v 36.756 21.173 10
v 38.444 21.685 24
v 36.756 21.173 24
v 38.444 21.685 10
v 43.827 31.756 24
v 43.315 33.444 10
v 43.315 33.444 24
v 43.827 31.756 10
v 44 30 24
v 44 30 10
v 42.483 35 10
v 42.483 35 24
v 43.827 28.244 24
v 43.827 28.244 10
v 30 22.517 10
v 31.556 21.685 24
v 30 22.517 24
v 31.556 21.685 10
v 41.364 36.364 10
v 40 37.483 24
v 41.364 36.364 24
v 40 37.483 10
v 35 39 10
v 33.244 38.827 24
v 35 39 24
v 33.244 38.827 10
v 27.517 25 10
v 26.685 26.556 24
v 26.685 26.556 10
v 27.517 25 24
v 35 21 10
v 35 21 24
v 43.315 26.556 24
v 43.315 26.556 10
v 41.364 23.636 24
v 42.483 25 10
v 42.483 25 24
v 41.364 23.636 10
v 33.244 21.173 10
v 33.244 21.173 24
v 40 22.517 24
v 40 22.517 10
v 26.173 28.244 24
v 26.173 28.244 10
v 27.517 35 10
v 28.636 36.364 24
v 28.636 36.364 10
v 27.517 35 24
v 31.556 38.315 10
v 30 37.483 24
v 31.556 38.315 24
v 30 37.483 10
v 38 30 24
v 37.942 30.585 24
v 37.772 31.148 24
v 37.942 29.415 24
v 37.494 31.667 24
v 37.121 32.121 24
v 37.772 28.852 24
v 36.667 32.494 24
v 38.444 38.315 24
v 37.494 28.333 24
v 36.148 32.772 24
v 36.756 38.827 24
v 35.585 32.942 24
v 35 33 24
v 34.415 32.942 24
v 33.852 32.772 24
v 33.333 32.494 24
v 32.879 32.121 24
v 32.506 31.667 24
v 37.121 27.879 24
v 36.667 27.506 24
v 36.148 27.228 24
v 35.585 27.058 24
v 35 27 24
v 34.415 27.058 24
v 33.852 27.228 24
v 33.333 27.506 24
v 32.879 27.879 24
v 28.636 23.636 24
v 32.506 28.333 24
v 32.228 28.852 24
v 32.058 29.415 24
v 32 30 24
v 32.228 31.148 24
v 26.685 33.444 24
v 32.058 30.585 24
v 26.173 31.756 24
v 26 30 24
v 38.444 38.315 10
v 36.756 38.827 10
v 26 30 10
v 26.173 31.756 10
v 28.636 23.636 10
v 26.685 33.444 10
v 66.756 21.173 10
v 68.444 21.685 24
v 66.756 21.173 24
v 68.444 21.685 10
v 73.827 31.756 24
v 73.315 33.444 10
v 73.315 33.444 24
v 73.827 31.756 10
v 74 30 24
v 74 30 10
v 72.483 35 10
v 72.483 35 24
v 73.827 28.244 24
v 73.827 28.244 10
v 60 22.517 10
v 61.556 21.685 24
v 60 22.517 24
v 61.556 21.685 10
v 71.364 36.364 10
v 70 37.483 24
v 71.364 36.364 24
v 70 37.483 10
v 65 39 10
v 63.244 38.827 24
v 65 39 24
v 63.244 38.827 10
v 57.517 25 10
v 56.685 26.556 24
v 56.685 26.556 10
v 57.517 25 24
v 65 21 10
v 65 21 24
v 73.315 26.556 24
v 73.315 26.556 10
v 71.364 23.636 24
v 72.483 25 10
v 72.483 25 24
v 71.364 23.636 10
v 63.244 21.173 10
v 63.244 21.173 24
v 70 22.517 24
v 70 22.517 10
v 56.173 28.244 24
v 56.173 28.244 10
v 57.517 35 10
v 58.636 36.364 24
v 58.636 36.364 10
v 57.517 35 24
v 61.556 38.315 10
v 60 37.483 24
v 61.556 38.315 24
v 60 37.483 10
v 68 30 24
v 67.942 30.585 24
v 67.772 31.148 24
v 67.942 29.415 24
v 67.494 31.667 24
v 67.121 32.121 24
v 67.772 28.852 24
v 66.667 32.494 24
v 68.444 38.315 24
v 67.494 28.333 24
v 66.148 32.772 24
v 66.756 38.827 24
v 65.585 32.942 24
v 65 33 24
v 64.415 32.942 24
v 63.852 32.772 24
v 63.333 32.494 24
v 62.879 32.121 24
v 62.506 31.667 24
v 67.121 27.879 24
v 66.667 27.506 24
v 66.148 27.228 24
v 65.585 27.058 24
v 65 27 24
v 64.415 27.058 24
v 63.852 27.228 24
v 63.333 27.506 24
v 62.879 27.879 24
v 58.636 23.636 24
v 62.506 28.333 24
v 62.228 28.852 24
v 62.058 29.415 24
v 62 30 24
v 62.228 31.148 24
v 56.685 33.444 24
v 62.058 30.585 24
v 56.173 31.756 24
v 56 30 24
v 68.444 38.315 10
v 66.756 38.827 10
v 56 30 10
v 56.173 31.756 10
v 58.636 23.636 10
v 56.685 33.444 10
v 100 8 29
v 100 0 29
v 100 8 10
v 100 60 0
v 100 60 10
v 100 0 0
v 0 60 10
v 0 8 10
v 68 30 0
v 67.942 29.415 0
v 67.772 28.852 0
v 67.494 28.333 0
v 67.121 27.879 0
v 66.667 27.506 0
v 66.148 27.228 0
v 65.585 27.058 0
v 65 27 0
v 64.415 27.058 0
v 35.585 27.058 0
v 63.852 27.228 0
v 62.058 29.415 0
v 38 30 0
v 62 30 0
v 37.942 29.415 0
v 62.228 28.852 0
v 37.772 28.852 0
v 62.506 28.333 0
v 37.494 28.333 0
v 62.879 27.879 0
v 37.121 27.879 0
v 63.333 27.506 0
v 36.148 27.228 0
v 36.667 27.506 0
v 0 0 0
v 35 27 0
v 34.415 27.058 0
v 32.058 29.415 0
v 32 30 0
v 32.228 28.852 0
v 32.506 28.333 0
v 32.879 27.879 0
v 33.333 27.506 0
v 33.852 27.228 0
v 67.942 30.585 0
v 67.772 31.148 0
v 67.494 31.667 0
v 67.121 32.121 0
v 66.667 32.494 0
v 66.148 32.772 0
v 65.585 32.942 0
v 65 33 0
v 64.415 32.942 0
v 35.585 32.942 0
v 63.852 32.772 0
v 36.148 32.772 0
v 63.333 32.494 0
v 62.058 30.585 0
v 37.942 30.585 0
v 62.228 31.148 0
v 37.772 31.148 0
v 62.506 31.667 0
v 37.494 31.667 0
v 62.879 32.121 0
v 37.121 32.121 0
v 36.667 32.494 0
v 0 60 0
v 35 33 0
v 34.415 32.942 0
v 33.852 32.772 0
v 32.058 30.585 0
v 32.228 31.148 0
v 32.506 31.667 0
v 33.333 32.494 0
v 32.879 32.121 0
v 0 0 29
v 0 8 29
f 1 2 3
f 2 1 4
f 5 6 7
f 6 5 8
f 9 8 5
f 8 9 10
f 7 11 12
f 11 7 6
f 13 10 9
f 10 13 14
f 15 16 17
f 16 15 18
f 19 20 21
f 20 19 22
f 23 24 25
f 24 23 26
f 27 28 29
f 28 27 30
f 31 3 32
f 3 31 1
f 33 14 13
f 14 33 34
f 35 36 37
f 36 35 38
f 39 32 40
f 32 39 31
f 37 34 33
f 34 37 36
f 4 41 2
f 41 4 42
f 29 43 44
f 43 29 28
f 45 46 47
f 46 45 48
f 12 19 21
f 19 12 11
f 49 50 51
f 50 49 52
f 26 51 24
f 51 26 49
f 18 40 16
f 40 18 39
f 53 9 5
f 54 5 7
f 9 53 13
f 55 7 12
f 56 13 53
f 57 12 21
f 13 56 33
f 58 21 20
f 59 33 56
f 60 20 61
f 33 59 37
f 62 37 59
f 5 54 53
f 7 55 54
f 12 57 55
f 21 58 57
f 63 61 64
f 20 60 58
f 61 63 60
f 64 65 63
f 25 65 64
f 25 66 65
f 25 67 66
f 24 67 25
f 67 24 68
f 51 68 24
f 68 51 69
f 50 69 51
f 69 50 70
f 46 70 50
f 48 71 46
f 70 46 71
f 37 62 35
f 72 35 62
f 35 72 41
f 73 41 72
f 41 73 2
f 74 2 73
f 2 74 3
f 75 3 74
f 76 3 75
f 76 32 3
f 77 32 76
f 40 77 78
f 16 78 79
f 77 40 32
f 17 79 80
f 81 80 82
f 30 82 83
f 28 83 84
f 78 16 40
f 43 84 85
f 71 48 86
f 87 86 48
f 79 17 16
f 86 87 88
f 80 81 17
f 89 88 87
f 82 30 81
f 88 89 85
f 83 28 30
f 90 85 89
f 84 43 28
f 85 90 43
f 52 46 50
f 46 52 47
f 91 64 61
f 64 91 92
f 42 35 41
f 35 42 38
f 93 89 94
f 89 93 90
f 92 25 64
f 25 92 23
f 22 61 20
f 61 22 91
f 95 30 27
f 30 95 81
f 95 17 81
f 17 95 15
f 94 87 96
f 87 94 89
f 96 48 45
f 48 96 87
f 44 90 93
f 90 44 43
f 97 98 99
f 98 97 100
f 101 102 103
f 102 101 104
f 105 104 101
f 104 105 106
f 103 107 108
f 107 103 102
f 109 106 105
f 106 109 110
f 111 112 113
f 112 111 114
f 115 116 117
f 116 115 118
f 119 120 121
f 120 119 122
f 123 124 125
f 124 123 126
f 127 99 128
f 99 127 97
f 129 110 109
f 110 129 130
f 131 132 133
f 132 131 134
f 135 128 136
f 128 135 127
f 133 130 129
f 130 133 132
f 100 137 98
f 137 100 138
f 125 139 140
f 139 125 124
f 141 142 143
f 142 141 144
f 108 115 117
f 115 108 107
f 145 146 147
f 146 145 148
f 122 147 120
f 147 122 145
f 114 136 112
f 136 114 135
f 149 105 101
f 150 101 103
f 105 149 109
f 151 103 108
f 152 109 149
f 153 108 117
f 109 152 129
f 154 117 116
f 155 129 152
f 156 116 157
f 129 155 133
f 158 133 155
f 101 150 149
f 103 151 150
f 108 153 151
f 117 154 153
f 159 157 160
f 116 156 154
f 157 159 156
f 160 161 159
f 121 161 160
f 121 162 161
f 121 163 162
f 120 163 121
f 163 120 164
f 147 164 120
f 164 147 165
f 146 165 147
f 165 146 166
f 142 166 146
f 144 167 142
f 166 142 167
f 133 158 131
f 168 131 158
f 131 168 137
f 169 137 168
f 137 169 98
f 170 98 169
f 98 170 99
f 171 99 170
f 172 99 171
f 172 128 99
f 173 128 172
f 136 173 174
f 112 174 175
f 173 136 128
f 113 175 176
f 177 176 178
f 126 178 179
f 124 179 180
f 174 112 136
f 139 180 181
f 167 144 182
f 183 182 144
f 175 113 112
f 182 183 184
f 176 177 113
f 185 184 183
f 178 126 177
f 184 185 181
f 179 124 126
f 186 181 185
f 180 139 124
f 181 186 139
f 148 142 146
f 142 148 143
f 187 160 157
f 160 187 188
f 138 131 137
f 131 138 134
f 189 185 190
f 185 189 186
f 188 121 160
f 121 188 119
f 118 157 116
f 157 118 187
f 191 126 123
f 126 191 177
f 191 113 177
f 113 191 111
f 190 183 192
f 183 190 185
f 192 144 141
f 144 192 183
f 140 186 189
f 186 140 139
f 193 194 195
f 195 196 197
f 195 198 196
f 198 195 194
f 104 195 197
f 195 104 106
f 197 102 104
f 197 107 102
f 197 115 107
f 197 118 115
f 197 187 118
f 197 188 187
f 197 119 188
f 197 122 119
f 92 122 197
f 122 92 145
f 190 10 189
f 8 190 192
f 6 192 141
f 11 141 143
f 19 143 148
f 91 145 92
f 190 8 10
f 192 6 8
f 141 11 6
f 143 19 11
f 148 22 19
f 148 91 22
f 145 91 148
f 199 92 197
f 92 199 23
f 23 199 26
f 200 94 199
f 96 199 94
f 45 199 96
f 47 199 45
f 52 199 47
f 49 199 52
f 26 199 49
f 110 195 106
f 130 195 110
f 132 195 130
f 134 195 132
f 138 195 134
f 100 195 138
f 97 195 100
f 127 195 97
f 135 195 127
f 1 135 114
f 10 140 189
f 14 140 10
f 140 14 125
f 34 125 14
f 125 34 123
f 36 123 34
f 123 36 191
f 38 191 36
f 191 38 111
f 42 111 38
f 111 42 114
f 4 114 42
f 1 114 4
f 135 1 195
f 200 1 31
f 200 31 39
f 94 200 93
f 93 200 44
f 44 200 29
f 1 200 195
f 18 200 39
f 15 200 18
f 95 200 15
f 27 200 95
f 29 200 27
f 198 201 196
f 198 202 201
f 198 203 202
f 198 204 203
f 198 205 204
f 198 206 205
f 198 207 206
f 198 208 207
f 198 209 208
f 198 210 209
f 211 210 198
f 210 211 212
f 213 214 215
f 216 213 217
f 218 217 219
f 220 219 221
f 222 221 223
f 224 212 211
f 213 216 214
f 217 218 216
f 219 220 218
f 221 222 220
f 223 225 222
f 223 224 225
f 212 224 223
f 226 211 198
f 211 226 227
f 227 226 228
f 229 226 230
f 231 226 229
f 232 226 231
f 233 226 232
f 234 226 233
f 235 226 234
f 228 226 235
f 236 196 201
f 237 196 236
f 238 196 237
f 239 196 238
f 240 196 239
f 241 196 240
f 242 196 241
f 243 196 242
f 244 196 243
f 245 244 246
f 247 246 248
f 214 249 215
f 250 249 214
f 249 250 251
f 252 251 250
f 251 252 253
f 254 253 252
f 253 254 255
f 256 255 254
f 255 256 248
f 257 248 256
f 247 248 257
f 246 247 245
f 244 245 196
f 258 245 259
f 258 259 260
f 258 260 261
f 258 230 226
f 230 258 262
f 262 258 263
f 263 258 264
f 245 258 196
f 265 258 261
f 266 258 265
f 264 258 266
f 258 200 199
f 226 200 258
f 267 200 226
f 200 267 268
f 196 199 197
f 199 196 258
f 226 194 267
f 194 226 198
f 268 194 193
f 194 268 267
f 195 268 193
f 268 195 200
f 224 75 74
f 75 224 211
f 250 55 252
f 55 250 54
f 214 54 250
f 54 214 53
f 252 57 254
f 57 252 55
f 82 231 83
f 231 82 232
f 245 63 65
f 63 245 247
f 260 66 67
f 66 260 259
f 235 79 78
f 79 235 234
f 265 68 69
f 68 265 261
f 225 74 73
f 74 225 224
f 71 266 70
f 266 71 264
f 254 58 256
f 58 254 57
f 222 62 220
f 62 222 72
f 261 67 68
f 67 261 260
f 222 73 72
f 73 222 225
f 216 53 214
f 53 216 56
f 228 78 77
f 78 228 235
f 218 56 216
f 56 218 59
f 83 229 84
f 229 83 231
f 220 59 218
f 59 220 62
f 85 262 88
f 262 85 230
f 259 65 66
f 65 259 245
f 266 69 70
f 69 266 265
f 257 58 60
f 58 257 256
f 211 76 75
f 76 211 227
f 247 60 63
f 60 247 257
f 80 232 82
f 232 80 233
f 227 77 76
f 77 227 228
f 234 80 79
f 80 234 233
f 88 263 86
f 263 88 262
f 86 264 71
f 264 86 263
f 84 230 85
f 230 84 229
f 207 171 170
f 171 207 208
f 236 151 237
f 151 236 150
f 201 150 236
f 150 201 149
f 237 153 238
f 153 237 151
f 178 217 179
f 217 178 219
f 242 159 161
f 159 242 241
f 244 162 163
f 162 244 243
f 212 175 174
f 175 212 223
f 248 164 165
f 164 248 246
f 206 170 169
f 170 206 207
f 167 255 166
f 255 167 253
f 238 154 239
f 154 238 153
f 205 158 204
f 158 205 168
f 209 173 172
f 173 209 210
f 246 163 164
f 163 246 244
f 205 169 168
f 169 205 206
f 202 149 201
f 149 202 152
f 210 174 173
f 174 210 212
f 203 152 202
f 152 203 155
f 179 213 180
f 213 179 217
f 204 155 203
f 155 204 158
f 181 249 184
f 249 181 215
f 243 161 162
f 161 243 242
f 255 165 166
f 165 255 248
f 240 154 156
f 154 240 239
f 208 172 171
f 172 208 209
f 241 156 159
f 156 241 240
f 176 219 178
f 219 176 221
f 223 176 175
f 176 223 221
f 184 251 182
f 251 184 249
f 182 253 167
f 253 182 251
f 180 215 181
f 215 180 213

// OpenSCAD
$fn = 32;

// ----------------------------------------------------------------------
// Drill jig: fence jig
// ----------------------------------------------------------------------

// --- parameters (mm) ---
plate_l = 100;            // plate length, X
plate_w = 60;             // plate width, Y
plate_t = 10;             // plate thickness
boss_d = 18;              // guide boss diameter
boss_h = 15;              // boss height above the plate
guide_d = 6;              // guide hole diameter
boss_pitch = 30;          // boss pitch
fence_h = 20;             // fence height above the plate
fence_t = 8;              // fence thickness

n_boss = 2;  // guide bosses
boss_x0 = (plate_l - (n_boss - 1) * boss_pitch) / 2;  // first boss X
boss_top = plate_t - 1 + boss_h;  // boss crown height
fence_top = plate_t - 1 + fence_h;  // fence crown height
total_h = max([fence_top, boss_top]);  // overall height

difference() {
  union() {
  cube([plate_l, plate_w, plate_t]);
  for (i = [0 : n_boss - 1])
    translate([boss_x0 + i * boss_pitch, plate_w / 2, plate_t - 1])
      cylinder(h = boss_h, d = boss_d);
  translate([0, 0, plate_t - 1]) cube([plate_l, fence_t, fence_h]);
  }
  for (i = [0 : n_boss - 1])
    translate([boss_x0 + i * boss_pitch, plate_w / 2, -1])
      cylinder(h = plate_t + boss_h, d = guide_d);
}
